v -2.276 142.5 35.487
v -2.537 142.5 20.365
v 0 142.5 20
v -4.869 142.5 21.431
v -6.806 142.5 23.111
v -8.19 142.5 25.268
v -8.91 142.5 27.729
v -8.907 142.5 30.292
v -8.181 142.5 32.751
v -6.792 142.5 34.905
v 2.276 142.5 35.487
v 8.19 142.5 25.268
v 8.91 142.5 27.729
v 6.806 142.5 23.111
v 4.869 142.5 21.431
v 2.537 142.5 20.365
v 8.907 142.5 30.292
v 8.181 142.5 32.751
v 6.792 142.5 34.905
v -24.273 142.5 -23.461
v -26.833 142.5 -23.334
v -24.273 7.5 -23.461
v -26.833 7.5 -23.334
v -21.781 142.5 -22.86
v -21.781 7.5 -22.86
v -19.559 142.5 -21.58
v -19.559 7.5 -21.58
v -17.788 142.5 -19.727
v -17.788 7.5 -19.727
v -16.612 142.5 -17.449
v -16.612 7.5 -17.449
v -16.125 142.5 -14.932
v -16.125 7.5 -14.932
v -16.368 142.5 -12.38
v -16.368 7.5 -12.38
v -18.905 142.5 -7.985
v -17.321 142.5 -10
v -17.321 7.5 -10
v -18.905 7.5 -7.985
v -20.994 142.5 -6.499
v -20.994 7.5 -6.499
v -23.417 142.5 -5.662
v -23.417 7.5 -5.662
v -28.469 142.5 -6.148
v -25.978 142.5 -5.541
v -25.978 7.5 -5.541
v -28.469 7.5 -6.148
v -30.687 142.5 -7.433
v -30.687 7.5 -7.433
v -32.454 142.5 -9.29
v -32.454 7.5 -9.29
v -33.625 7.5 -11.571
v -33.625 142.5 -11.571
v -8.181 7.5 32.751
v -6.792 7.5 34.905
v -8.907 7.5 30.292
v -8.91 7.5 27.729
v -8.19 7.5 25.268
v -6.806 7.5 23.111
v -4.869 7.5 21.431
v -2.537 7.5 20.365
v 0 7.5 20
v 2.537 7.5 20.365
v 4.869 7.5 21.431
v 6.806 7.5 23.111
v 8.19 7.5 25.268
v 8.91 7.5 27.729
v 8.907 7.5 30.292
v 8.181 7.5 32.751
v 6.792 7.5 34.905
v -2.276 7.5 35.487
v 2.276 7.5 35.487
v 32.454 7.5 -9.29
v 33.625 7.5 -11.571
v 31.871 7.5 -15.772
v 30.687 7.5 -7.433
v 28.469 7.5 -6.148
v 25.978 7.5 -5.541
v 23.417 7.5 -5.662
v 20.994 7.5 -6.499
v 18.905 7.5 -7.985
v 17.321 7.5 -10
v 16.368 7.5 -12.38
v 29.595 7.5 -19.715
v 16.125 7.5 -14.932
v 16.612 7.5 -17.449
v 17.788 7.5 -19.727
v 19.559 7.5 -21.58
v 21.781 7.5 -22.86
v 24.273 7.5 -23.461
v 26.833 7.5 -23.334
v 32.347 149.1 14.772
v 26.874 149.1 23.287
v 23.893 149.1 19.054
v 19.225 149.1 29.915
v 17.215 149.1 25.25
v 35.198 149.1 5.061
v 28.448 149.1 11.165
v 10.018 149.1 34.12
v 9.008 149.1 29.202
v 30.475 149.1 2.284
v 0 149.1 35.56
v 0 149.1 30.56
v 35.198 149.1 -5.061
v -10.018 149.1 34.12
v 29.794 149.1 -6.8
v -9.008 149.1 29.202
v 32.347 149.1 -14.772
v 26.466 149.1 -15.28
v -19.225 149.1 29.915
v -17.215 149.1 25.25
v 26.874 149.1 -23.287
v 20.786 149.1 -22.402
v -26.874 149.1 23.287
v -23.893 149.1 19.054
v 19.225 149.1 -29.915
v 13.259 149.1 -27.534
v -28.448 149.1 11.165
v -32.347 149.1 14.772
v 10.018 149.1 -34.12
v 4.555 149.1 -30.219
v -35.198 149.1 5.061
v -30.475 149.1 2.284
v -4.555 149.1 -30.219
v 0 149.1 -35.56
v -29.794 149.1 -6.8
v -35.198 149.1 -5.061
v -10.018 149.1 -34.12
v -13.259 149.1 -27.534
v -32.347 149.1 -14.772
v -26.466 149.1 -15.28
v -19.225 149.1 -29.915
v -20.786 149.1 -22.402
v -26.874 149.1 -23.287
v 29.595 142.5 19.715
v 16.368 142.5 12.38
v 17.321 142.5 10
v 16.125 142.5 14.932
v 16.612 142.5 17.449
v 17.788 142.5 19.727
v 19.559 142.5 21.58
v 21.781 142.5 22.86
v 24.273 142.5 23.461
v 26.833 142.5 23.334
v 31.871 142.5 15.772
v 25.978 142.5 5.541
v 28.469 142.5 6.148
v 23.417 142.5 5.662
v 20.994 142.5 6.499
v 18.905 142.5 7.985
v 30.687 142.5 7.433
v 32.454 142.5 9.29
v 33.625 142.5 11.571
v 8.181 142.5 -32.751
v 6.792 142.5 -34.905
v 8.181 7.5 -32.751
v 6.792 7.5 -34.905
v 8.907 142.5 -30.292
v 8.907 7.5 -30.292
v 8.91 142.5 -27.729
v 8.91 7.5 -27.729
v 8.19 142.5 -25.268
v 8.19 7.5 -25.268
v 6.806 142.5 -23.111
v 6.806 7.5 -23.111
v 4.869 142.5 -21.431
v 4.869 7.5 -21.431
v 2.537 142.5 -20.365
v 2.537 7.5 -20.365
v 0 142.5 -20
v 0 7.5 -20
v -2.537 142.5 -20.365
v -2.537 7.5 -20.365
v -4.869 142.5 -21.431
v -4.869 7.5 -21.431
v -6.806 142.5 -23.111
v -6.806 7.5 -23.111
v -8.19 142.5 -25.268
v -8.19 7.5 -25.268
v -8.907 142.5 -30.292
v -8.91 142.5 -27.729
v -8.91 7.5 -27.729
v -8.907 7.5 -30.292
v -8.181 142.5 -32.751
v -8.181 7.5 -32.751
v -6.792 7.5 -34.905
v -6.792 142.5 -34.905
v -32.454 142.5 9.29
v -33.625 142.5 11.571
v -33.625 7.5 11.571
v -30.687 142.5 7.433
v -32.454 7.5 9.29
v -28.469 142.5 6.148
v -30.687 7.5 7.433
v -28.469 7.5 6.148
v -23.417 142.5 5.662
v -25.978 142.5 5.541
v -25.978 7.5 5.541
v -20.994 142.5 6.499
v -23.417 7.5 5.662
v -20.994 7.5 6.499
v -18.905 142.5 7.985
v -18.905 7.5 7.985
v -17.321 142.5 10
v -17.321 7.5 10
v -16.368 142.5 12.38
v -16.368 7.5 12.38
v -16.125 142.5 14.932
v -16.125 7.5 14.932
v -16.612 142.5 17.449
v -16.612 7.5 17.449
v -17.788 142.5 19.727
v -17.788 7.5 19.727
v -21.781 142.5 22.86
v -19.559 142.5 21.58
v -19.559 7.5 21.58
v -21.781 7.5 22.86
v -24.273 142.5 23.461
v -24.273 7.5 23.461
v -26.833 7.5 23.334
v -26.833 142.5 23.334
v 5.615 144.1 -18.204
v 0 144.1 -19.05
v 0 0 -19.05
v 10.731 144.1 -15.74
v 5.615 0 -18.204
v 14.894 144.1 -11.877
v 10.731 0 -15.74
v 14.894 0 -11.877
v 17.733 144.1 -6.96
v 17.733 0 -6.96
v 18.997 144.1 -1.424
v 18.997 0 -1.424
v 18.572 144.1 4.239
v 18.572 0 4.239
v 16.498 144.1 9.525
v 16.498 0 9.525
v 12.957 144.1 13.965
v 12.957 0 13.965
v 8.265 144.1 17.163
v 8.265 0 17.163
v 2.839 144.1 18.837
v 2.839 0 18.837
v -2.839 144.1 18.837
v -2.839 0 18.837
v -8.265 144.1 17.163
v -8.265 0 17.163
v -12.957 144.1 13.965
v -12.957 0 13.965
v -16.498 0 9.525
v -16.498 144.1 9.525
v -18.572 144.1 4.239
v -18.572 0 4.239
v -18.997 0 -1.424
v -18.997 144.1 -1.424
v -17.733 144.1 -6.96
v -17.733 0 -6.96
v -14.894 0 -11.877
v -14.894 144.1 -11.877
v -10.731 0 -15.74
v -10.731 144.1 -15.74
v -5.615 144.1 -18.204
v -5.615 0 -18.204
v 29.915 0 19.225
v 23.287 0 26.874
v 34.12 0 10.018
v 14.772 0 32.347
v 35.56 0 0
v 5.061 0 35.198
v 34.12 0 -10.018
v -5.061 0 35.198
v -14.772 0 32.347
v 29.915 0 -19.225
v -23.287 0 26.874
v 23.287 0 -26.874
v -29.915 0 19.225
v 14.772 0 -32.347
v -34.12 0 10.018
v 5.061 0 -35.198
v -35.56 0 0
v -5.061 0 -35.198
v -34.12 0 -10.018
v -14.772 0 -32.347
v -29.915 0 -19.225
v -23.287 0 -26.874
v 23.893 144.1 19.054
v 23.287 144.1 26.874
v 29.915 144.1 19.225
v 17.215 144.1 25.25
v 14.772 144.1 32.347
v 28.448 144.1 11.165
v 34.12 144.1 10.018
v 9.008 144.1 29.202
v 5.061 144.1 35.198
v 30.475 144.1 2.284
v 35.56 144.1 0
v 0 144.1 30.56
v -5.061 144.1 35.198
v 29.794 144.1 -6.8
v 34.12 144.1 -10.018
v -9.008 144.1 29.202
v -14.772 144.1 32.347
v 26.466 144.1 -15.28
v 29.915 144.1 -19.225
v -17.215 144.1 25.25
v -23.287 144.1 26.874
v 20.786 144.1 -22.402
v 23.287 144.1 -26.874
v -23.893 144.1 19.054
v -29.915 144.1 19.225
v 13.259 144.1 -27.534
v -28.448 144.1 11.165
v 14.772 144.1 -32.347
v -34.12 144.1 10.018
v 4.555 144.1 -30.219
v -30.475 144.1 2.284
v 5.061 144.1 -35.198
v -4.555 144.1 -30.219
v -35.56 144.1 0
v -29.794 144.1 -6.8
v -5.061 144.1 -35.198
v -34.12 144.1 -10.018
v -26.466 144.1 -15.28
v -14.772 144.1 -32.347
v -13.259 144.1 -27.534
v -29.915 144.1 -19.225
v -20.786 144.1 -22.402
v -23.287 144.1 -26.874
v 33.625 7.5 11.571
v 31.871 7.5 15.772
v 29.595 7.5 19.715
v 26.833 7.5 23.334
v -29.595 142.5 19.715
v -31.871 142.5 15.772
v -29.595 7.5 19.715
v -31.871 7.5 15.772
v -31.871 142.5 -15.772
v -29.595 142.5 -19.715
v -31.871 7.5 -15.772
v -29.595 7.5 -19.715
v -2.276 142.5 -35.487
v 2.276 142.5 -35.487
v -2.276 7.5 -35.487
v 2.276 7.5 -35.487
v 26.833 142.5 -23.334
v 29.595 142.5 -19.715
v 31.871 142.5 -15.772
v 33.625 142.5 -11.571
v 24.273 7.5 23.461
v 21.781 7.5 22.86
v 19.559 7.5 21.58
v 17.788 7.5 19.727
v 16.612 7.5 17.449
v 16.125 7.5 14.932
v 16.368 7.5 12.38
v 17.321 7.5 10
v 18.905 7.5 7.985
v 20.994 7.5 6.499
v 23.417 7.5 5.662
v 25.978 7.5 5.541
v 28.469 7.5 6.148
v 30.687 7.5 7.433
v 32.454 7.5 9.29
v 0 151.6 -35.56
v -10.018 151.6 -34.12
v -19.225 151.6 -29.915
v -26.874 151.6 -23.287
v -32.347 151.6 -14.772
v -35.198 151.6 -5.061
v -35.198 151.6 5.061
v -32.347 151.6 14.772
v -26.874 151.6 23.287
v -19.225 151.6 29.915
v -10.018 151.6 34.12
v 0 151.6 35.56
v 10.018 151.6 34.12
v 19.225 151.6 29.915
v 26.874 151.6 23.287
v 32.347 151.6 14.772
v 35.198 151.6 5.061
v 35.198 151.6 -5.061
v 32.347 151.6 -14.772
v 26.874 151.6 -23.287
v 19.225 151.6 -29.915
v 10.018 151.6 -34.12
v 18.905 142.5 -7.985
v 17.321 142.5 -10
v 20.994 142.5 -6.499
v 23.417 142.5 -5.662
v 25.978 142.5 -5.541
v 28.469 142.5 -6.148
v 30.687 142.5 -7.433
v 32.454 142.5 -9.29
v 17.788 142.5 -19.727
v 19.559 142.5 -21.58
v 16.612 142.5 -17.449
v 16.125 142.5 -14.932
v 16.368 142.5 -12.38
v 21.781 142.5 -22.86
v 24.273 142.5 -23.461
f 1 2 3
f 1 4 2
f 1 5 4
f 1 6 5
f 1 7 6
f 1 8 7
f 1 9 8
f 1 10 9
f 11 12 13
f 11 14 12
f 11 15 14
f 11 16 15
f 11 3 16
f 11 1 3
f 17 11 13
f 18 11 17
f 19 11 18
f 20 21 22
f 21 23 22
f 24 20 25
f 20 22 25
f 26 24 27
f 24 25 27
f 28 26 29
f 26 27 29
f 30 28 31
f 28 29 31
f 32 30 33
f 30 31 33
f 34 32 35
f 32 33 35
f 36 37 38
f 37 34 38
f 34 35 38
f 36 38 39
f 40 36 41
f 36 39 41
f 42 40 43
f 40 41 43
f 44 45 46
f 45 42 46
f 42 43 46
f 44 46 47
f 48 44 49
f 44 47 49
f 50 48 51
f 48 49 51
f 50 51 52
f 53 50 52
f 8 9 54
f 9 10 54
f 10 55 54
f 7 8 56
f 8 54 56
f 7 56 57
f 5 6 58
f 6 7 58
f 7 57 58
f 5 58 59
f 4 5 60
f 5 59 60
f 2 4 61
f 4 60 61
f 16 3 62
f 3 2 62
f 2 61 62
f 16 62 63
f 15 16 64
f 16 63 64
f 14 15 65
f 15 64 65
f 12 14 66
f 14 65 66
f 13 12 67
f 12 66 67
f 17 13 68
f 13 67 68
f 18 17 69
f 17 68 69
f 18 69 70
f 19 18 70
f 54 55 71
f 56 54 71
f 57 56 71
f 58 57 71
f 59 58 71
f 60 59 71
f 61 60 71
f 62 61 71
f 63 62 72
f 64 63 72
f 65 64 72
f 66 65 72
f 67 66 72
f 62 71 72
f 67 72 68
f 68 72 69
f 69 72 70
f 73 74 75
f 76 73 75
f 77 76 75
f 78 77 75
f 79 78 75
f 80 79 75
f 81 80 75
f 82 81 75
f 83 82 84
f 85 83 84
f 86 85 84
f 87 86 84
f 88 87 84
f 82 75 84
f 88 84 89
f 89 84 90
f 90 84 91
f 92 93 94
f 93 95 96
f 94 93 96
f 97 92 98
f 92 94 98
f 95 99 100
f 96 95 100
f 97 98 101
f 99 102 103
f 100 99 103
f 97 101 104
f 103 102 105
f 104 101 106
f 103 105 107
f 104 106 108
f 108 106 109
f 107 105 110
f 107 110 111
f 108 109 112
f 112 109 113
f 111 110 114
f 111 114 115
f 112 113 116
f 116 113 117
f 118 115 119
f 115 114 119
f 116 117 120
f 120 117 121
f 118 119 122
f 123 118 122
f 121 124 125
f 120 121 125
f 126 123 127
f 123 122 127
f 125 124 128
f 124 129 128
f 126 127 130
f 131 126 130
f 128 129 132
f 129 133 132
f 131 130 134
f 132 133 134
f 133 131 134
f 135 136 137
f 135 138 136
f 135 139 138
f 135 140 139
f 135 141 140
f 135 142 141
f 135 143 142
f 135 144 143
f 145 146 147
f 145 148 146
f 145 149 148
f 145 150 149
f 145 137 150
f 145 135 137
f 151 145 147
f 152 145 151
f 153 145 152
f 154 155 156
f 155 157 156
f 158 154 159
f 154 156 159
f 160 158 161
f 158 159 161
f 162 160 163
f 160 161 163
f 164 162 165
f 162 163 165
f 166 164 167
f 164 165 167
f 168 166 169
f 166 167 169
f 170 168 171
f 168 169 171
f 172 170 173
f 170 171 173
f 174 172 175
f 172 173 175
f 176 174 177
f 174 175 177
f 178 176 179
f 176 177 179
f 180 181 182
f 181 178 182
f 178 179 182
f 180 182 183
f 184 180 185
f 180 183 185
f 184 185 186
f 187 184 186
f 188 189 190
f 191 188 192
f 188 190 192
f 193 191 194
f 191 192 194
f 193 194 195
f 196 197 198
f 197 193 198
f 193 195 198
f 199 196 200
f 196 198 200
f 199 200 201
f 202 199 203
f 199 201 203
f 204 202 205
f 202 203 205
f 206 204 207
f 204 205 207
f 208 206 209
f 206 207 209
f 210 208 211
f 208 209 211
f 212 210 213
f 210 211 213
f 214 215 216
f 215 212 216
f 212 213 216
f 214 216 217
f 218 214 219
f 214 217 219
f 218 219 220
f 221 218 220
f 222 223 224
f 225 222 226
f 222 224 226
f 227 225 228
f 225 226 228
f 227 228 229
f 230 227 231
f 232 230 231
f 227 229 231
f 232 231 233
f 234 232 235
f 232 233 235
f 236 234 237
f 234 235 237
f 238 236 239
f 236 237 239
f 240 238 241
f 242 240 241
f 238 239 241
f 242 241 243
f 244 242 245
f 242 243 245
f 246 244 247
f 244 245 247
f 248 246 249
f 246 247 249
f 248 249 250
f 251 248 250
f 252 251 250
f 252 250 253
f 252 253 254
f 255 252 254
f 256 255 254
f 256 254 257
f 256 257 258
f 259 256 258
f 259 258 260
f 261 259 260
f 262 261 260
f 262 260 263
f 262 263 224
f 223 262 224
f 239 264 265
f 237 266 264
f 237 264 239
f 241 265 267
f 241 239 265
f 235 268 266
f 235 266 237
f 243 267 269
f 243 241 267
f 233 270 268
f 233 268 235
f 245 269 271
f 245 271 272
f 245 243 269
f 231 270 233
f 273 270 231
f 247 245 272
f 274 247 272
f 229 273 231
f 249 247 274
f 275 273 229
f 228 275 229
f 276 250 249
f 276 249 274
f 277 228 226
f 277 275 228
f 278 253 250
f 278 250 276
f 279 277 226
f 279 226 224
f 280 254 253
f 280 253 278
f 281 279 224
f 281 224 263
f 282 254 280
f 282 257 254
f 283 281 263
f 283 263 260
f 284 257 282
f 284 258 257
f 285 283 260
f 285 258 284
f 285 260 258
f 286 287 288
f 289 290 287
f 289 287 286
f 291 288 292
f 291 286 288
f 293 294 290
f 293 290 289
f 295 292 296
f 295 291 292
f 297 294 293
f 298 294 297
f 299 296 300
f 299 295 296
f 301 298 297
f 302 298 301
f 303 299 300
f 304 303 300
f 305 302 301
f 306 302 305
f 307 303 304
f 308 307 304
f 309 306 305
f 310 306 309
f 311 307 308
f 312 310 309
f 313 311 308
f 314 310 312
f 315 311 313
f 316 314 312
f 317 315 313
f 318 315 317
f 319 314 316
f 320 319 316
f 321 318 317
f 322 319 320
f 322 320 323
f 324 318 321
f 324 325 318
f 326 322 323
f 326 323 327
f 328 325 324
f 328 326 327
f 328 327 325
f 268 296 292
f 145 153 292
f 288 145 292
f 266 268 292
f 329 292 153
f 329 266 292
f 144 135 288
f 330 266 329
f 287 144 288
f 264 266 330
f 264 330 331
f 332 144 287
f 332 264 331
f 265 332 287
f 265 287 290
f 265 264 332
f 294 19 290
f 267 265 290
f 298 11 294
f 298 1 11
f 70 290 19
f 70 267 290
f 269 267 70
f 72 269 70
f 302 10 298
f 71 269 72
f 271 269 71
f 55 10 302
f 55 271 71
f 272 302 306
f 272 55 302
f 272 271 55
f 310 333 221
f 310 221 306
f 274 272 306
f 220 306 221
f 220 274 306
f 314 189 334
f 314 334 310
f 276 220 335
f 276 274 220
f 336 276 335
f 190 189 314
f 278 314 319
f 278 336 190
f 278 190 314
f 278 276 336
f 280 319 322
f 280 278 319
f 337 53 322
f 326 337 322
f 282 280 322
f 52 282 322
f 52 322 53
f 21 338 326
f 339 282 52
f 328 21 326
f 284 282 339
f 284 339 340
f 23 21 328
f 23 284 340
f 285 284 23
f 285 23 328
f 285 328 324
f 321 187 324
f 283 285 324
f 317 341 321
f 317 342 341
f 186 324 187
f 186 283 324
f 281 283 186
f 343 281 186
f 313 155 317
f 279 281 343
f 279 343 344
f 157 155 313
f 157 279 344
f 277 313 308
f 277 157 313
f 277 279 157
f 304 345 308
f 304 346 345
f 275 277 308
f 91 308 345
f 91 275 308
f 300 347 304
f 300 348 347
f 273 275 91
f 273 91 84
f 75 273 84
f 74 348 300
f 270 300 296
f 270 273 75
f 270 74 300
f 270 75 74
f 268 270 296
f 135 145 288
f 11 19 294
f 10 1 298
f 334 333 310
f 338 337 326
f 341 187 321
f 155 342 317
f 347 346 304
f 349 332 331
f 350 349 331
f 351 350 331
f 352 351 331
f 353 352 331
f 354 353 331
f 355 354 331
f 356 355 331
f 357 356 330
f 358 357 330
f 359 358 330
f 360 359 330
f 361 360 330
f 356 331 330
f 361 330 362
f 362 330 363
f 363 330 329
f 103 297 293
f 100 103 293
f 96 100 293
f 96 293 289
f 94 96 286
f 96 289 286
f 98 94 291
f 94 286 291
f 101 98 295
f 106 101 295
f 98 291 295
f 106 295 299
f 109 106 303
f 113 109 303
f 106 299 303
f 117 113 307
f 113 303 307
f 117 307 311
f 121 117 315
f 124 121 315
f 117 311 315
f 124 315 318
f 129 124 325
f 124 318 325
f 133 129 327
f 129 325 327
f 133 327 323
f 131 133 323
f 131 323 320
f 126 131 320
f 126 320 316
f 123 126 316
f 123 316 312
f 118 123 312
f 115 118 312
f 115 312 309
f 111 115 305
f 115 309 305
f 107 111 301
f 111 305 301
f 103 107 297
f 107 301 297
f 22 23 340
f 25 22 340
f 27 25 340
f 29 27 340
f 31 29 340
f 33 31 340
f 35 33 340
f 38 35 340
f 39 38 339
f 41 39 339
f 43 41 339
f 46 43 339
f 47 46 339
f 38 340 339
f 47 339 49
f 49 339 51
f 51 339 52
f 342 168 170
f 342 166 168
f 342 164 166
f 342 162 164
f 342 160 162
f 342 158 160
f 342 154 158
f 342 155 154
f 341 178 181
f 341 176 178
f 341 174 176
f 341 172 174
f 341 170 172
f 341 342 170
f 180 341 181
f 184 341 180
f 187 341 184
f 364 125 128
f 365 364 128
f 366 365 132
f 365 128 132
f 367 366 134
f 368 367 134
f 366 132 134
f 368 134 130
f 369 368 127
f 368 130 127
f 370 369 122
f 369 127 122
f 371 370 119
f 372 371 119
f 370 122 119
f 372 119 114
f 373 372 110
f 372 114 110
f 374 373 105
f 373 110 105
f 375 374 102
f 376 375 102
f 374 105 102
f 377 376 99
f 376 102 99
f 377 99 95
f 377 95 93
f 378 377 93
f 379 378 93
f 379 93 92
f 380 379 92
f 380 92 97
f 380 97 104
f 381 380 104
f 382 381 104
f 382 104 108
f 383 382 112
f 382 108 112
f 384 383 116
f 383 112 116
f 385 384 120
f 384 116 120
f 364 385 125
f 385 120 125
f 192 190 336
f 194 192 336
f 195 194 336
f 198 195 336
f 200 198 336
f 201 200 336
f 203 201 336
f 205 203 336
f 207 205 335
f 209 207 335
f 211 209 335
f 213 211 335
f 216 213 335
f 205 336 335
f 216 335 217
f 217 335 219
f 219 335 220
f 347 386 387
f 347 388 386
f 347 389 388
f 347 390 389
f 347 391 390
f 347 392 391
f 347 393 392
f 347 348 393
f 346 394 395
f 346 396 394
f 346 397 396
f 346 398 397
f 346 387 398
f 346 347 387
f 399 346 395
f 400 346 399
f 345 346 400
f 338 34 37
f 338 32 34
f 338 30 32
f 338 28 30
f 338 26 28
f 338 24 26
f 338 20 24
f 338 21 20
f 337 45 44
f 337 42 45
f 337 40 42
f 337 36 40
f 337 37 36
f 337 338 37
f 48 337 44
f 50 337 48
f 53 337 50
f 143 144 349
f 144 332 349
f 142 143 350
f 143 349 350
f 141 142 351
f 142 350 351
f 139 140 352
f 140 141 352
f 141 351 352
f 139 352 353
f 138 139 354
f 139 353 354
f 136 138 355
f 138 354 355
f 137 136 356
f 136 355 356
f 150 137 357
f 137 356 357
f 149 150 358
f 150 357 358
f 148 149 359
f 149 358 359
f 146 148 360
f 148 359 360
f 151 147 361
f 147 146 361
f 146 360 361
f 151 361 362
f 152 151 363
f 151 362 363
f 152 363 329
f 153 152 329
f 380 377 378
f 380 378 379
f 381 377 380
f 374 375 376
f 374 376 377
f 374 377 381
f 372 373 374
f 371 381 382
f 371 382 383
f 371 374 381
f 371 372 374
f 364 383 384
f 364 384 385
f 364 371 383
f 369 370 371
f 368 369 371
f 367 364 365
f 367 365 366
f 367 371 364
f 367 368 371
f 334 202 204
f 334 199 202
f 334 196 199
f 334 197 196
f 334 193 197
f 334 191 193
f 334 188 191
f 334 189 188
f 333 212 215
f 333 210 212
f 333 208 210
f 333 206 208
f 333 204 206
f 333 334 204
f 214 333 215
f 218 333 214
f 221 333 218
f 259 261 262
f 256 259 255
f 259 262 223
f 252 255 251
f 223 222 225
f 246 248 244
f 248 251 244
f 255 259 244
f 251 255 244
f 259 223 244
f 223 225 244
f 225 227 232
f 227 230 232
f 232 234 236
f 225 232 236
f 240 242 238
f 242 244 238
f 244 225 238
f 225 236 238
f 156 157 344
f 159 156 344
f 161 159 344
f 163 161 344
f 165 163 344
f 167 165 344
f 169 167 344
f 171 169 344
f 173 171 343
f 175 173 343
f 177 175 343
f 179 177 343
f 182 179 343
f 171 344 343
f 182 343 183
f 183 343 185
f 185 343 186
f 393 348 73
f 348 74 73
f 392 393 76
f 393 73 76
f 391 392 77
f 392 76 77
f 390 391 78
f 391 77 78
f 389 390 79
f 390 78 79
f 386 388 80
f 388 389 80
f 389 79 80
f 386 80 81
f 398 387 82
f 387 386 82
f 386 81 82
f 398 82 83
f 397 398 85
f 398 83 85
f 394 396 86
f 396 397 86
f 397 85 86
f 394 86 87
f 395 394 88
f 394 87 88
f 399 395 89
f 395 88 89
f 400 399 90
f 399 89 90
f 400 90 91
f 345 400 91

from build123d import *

# Parameters (mm, degrees)
BOSS_EXTRUDE1_DEPTH = 150
CUT_EXTRUDE7_START  = -7.5
SKETCH2_R           = 9
CUT_EXTRUDE7_DEPTH  = 135
CIRPATTERN1_COUNT   = 6
SKETCH3_R           = 19.05
CUT_EXTRUDE8_DEPTH  = 159.205648445
CUT_EXTRUDE9_START  = -5.9
SKETCH5_R           = 35.56
CUT_EXTRUDE9_DEPTH  = 5.9
SKETCH6_R           = 30.56
BOSS_EXTRUDE2_DEPTH = 5
SKETCH7_R           = 35.56
BOSS_EXTRUDE3_DEPTH = 2.5


with BuildPart() as part:
    # Sketch1 → Boss-Extrude1 (new body)
    with BuildSketch(Plane(origin=(0, 0, 0), x_dir=(1, 0, 0), z_dir=(0, 1, 0))):
        with BuildLine():
            ThreePointArc((-35.56, 0), (0, 35.56), (35.56, 0))
            ThreePointArc((35.56, 0), (0, -35.56), (-35.56, 0))
        make_face()
    extrude(amount=BOSS_EXTRUDE1_DEPTH)

    # Sketch2 → Cut-Extrude7 (cut)
    with BuildSketch(Plane(origin=(0, 0, 0), x_dir=(-1, 0, 0), z_dir=(0, -1, 0)).offset(CUT_EXTRUDE7_START)):
        with Locations((0, 29)):
            Circle(SKETCH2_R)
    cut_extrude7 = extrude(amount=-CUT_EXTRUDE7_DEPTH, mode=Mode.SUBTRACT)

    # CirPattern1: Cut-Extrude7 ×6 about axis
    cirpattern1_axis = Axis((0, 0, 0), (0, 1, 0))
    for i in range(1, CIRPATTERN1_COUNT):
        add(cut_extrude7.rotate(cirpattern1_axis, i * 360 / CIRPATTERN1_COUNT), mode=Mode.SUBTRACT)

    # Sketch3 → Cut-Extrude8 (cut, through all)
    with BuildSketch(Plane(origin=(0, 0, 0), x_dir=(-1, 0, 0), z_dir=(0, -1, 0))):
        with Locations(Location((0, 0, 0), (0, 0, 90))):
            Circle(SKETCH3_R)
    extrude(amount=-CUT_EXTRUDE8_DEPTH, mode=Mode.SUBTRACT)

    # Sketch5 → Cut-Extrude9 (cut)
    with BuildSketch(Plane(origin=(0, 150, 0), x_dir=(1, 0, 0), z_dir=(0, 1, 0)).offset(CUT_EXTRUDE9_START)):
        with Locations(Location((0, 0, 0), (0, 0, 90))):
            Circle(SKETCH5_R)
    extrude(amount=CUT_EXTRUDE9_DEPTH, mode=Mode.SUBTRACT)

    # Sketch6 → Boss-Extrude2 (add)
    with BuildSketch(Plane(origin=(0, 144.1, 0), x_dir=(1, 0, 0), z_dir=(0, 1, 0))):
        with Locations(Location((0, 0, 0), (0, 0, 270))):
            Circle(SKETCH6_R)
    extrude(amount=BOSS_EXTRUDE2_DEPTH)

    # Sketch7 → Boss-Extrude3 (add)
    with BuildSketch(Plane(origin=(0, 149.1, 0), x_dir=(1, 0, 0), z_dir=(0, 1, 0))):
        with Locations(Location((0, 0, 0), (0, 0, 90))):
            Circle(SKETCH7_R)
    extrude(amount=BOSS_EXTRUDE3_DEPTH)


solid = part.part
